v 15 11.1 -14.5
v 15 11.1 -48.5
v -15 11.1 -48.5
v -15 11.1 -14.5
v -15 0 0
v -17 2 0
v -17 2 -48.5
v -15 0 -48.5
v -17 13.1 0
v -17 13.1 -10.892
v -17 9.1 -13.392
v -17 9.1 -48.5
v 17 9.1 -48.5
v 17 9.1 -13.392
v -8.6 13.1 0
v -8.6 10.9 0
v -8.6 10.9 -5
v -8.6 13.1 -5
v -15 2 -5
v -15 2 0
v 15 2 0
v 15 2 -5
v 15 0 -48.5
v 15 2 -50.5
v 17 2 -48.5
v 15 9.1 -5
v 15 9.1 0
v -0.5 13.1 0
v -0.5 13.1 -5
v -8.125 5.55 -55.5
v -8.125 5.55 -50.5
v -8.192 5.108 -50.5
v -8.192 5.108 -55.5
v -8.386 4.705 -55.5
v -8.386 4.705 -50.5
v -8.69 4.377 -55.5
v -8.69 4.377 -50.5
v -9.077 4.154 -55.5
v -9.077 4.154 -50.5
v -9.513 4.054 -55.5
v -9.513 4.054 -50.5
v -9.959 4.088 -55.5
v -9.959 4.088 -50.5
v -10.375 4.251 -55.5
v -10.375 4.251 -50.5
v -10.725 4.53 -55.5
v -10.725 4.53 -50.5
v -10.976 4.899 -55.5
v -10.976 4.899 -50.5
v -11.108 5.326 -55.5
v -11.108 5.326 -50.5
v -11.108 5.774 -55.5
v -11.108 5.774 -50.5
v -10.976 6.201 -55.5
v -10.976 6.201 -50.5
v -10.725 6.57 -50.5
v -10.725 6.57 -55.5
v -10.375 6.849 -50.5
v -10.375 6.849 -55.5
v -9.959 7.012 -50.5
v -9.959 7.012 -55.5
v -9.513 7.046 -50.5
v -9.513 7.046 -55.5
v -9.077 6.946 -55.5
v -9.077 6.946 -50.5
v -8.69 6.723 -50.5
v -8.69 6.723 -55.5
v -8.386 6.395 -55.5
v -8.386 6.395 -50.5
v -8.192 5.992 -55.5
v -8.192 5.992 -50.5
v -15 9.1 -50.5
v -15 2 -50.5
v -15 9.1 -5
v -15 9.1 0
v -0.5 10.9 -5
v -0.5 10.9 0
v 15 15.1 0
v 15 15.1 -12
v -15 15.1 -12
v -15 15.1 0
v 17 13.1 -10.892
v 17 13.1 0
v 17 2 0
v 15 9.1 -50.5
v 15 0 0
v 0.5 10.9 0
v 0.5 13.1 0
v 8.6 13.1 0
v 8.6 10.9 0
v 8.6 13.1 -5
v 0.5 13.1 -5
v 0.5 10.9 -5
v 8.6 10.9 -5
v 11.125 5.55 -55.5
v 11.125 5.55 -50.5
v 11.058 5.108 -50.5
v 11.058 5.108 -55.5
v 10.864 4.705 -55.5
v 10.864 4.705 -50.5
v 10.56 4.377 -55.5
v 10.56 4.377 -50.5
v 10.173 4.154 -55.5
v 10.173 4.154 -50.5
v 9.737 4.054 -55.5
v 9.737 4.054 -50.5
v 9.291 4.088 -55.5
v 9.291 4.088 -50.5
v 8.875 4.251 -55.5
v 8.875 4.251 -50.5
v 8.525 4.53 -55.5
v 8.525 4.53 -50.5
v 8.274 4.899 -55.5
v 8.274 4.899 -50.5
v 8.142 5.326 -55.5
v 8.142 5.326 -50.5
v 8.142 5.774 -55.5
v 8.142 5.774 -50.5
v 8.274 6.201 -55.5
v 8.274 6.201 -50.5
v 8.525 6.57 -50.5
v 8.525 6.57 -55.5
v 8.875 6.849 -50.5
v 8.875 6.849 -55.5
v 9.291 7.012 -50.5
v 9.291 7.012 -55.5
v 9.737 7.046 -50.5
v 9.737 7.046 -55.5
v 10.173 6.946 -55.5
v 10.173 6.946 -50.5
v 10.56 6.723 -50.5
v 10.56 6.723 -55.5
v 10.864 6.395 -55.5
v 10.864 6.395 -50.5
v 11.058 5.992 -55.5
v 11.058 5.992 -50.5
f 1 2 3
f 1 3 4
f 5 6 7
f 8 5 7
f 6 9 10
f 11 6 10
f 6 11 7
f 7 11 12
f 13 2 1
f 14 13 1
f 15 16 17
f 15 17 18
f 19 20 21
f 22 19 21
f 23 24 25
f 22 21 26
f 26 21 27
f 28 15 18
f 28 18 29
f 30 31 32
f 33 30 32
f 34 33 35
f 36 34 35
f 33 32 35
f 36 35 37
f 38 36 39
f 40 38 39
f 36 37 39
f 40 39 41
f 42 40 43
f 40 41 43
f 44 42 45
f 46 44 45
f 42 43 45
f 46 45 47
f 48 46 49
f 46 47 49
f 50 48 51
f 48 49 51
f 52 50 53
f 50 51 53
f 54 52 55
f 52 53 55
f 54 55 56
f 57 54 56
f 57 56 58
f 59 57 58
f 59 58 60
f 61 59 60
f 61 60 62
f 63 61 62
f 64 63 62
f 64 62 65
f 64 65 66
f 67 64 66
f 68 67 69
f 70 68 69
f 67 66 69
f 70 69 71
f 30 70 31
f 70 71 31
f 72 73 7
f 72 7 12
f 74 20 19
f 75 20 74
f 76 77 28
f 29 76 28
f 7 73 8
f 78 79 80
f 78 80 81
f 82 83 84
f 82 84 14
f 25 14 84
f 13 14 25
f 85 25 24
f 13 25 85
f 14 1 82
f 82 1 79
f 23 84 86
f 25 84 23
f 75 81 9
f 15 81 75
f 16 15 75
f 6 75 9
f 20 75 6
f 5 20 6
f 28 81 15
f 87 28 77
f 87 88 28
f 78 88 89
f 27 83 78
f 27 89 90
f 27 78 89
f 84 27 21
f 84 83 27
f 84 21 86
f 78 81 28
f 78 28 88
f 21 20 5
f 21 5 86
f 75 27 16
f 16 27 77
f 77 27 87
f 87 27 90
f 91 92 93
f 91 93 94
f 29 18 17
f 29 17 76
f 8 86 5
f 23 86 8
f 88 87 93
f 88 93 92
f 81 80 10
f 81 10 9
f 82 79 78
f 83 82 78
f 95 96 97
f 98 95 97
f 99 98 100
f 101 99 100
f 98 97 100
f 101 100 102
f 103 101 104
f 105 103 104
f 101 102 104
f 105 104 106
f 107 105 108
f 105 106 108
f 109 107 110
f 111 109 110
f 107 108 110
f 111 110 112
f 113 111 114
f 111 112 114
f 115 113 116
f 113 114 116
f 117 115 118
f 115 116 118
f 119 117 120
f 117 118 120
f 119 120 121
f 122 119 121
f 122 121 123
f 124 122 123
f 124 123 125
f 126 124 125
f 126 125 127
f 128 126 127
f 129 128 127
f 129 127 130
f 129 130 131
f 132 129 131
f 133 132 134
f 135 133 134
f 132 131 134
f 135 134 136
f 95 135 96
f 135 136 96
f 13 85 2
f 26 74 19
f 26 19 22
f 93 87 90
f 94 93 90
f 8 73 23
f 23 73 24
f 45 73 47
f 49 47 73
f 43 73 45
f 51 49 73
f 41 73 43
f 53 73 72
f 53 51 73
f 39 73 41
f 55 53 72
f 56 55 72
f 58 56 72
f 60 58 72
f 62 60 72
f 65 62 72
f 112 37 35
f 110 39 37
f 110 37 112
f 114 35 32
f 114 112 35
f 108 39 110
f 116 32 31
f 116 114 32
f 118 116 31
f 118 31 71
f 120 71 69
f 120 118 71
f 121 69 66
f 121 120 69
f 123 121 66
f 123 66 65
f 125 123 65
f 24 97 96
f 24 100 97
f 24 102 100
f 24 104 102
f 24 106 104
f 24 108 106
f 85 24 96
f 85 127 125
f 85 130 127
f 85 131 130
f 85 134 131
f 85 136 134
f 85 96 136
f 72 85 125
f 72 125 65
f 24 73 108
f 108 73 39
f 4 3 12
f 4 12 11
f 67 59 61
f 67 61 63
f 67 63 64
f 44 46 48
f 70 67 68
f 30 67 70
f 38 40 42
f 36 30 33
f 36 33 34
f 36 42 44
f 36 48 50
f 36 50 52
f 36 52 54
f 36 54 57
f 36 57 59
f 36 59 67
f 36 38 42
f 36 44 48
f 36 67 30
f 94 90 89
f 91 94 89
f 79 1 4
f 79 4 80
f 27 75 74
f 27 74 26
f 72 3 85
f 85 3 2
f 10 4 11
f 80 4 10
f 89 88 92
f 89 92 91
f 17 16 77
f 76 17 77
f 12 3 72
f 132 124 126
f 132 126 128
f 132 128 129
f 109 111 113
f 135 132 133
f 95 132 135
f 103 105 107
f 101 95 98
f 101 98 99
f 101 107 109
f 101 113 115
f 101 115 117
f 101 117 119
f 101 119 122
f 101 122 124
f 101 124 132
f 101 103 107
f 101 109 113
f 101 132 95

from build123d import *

# Parameters (mm, degrees)
BOSS_EXTRUDE1_DEPTH = 17
SKETCH2_R           = 1.5
BOSS_EXTRUDE2_DEPTH = 5
SKETCH3_W           = 30
SKETCH3_H           = 7.1
SKETCH3_W_2         = 8.1
SKETCH3_H_2         = 2.2
CUT_EXTRUDE1_DEPTH  = 5
CHAMFER1_SIZE       = 2


with BuildPart() as part:
    # Sketch1 → Boss-Extrude1 (new, symmetric)
    with BuildSketch(Plane(origin=(0, 0, 0), x_dir=(0, 0, -1), z_dir=(1, 0, 0))):
        Polygon((0, 0), (50.5, 0), (50.5, 11.1), (14.5, 11.1), (12, 15.1), (0, 15.1), align=None)
    extrude(amount=BOSS_EXTRUDE1_DEPTH, both=True)

    # Sketch2 → Boss-Extrude2 (add)
    with BuildSketch(Plane(origin=(0, 0, -50.5), x_dir=(-1, 0, 0), z_dir=(0, 0, -1))):
        with Locations(Location((9.625, 5.55, 0), (0, 0, 180))):
            Circle(SKETCH2_R)
        with Locations(Location((-9.625, 5.55, 0), (0, 0, 180))):
            Circle(SKETCH2_R)
    extrude(amount=BOSS_EXTRUDE2_DEPTH)

    # Sketch3 → Cut-Extrude1 (cut)
    with BuildSketch(Plane.XY):
        with Locations((0, 5.55)):
            Rectangle(SKETCH3_W, SKETCH3_H)
        with Locations((-4.55, 12)):
            Rectangle(SKETCH3_W_2, SKETCH3_H_2)
        with Locations((4.55, 12)):
            Rectangle(SKETCH3_W_2, SKETCH3_H_2)
    extrude(amount=-CUT_EXTRUDE1_DEPTH, mode=Mode.SUBTRACT)

    # Chamfer1
    chamfer1_edges = [part.edges().sort_by_distance(p)[0] for p in [
        (0, 11.1, -50.5),
        (0, 0, -50.5),
        (17, 5.55, -50.5),
        (17, 11.1, -32.5),
        (17, 13.1, -13.25),
        (17, 15.1, -6),
        (-17, 15.1, -6),
        (-17, 13.1, -13.25),
        (-17, 11.1, -32.5),
        (-17, 5.55, -50.5),
        (-17, 0, -25.25),
        (17, 0, -25.25),
    ]]
    chamfer(chamfer1_edges, length=CHAMFER1_SIZE)


solid = part.part
